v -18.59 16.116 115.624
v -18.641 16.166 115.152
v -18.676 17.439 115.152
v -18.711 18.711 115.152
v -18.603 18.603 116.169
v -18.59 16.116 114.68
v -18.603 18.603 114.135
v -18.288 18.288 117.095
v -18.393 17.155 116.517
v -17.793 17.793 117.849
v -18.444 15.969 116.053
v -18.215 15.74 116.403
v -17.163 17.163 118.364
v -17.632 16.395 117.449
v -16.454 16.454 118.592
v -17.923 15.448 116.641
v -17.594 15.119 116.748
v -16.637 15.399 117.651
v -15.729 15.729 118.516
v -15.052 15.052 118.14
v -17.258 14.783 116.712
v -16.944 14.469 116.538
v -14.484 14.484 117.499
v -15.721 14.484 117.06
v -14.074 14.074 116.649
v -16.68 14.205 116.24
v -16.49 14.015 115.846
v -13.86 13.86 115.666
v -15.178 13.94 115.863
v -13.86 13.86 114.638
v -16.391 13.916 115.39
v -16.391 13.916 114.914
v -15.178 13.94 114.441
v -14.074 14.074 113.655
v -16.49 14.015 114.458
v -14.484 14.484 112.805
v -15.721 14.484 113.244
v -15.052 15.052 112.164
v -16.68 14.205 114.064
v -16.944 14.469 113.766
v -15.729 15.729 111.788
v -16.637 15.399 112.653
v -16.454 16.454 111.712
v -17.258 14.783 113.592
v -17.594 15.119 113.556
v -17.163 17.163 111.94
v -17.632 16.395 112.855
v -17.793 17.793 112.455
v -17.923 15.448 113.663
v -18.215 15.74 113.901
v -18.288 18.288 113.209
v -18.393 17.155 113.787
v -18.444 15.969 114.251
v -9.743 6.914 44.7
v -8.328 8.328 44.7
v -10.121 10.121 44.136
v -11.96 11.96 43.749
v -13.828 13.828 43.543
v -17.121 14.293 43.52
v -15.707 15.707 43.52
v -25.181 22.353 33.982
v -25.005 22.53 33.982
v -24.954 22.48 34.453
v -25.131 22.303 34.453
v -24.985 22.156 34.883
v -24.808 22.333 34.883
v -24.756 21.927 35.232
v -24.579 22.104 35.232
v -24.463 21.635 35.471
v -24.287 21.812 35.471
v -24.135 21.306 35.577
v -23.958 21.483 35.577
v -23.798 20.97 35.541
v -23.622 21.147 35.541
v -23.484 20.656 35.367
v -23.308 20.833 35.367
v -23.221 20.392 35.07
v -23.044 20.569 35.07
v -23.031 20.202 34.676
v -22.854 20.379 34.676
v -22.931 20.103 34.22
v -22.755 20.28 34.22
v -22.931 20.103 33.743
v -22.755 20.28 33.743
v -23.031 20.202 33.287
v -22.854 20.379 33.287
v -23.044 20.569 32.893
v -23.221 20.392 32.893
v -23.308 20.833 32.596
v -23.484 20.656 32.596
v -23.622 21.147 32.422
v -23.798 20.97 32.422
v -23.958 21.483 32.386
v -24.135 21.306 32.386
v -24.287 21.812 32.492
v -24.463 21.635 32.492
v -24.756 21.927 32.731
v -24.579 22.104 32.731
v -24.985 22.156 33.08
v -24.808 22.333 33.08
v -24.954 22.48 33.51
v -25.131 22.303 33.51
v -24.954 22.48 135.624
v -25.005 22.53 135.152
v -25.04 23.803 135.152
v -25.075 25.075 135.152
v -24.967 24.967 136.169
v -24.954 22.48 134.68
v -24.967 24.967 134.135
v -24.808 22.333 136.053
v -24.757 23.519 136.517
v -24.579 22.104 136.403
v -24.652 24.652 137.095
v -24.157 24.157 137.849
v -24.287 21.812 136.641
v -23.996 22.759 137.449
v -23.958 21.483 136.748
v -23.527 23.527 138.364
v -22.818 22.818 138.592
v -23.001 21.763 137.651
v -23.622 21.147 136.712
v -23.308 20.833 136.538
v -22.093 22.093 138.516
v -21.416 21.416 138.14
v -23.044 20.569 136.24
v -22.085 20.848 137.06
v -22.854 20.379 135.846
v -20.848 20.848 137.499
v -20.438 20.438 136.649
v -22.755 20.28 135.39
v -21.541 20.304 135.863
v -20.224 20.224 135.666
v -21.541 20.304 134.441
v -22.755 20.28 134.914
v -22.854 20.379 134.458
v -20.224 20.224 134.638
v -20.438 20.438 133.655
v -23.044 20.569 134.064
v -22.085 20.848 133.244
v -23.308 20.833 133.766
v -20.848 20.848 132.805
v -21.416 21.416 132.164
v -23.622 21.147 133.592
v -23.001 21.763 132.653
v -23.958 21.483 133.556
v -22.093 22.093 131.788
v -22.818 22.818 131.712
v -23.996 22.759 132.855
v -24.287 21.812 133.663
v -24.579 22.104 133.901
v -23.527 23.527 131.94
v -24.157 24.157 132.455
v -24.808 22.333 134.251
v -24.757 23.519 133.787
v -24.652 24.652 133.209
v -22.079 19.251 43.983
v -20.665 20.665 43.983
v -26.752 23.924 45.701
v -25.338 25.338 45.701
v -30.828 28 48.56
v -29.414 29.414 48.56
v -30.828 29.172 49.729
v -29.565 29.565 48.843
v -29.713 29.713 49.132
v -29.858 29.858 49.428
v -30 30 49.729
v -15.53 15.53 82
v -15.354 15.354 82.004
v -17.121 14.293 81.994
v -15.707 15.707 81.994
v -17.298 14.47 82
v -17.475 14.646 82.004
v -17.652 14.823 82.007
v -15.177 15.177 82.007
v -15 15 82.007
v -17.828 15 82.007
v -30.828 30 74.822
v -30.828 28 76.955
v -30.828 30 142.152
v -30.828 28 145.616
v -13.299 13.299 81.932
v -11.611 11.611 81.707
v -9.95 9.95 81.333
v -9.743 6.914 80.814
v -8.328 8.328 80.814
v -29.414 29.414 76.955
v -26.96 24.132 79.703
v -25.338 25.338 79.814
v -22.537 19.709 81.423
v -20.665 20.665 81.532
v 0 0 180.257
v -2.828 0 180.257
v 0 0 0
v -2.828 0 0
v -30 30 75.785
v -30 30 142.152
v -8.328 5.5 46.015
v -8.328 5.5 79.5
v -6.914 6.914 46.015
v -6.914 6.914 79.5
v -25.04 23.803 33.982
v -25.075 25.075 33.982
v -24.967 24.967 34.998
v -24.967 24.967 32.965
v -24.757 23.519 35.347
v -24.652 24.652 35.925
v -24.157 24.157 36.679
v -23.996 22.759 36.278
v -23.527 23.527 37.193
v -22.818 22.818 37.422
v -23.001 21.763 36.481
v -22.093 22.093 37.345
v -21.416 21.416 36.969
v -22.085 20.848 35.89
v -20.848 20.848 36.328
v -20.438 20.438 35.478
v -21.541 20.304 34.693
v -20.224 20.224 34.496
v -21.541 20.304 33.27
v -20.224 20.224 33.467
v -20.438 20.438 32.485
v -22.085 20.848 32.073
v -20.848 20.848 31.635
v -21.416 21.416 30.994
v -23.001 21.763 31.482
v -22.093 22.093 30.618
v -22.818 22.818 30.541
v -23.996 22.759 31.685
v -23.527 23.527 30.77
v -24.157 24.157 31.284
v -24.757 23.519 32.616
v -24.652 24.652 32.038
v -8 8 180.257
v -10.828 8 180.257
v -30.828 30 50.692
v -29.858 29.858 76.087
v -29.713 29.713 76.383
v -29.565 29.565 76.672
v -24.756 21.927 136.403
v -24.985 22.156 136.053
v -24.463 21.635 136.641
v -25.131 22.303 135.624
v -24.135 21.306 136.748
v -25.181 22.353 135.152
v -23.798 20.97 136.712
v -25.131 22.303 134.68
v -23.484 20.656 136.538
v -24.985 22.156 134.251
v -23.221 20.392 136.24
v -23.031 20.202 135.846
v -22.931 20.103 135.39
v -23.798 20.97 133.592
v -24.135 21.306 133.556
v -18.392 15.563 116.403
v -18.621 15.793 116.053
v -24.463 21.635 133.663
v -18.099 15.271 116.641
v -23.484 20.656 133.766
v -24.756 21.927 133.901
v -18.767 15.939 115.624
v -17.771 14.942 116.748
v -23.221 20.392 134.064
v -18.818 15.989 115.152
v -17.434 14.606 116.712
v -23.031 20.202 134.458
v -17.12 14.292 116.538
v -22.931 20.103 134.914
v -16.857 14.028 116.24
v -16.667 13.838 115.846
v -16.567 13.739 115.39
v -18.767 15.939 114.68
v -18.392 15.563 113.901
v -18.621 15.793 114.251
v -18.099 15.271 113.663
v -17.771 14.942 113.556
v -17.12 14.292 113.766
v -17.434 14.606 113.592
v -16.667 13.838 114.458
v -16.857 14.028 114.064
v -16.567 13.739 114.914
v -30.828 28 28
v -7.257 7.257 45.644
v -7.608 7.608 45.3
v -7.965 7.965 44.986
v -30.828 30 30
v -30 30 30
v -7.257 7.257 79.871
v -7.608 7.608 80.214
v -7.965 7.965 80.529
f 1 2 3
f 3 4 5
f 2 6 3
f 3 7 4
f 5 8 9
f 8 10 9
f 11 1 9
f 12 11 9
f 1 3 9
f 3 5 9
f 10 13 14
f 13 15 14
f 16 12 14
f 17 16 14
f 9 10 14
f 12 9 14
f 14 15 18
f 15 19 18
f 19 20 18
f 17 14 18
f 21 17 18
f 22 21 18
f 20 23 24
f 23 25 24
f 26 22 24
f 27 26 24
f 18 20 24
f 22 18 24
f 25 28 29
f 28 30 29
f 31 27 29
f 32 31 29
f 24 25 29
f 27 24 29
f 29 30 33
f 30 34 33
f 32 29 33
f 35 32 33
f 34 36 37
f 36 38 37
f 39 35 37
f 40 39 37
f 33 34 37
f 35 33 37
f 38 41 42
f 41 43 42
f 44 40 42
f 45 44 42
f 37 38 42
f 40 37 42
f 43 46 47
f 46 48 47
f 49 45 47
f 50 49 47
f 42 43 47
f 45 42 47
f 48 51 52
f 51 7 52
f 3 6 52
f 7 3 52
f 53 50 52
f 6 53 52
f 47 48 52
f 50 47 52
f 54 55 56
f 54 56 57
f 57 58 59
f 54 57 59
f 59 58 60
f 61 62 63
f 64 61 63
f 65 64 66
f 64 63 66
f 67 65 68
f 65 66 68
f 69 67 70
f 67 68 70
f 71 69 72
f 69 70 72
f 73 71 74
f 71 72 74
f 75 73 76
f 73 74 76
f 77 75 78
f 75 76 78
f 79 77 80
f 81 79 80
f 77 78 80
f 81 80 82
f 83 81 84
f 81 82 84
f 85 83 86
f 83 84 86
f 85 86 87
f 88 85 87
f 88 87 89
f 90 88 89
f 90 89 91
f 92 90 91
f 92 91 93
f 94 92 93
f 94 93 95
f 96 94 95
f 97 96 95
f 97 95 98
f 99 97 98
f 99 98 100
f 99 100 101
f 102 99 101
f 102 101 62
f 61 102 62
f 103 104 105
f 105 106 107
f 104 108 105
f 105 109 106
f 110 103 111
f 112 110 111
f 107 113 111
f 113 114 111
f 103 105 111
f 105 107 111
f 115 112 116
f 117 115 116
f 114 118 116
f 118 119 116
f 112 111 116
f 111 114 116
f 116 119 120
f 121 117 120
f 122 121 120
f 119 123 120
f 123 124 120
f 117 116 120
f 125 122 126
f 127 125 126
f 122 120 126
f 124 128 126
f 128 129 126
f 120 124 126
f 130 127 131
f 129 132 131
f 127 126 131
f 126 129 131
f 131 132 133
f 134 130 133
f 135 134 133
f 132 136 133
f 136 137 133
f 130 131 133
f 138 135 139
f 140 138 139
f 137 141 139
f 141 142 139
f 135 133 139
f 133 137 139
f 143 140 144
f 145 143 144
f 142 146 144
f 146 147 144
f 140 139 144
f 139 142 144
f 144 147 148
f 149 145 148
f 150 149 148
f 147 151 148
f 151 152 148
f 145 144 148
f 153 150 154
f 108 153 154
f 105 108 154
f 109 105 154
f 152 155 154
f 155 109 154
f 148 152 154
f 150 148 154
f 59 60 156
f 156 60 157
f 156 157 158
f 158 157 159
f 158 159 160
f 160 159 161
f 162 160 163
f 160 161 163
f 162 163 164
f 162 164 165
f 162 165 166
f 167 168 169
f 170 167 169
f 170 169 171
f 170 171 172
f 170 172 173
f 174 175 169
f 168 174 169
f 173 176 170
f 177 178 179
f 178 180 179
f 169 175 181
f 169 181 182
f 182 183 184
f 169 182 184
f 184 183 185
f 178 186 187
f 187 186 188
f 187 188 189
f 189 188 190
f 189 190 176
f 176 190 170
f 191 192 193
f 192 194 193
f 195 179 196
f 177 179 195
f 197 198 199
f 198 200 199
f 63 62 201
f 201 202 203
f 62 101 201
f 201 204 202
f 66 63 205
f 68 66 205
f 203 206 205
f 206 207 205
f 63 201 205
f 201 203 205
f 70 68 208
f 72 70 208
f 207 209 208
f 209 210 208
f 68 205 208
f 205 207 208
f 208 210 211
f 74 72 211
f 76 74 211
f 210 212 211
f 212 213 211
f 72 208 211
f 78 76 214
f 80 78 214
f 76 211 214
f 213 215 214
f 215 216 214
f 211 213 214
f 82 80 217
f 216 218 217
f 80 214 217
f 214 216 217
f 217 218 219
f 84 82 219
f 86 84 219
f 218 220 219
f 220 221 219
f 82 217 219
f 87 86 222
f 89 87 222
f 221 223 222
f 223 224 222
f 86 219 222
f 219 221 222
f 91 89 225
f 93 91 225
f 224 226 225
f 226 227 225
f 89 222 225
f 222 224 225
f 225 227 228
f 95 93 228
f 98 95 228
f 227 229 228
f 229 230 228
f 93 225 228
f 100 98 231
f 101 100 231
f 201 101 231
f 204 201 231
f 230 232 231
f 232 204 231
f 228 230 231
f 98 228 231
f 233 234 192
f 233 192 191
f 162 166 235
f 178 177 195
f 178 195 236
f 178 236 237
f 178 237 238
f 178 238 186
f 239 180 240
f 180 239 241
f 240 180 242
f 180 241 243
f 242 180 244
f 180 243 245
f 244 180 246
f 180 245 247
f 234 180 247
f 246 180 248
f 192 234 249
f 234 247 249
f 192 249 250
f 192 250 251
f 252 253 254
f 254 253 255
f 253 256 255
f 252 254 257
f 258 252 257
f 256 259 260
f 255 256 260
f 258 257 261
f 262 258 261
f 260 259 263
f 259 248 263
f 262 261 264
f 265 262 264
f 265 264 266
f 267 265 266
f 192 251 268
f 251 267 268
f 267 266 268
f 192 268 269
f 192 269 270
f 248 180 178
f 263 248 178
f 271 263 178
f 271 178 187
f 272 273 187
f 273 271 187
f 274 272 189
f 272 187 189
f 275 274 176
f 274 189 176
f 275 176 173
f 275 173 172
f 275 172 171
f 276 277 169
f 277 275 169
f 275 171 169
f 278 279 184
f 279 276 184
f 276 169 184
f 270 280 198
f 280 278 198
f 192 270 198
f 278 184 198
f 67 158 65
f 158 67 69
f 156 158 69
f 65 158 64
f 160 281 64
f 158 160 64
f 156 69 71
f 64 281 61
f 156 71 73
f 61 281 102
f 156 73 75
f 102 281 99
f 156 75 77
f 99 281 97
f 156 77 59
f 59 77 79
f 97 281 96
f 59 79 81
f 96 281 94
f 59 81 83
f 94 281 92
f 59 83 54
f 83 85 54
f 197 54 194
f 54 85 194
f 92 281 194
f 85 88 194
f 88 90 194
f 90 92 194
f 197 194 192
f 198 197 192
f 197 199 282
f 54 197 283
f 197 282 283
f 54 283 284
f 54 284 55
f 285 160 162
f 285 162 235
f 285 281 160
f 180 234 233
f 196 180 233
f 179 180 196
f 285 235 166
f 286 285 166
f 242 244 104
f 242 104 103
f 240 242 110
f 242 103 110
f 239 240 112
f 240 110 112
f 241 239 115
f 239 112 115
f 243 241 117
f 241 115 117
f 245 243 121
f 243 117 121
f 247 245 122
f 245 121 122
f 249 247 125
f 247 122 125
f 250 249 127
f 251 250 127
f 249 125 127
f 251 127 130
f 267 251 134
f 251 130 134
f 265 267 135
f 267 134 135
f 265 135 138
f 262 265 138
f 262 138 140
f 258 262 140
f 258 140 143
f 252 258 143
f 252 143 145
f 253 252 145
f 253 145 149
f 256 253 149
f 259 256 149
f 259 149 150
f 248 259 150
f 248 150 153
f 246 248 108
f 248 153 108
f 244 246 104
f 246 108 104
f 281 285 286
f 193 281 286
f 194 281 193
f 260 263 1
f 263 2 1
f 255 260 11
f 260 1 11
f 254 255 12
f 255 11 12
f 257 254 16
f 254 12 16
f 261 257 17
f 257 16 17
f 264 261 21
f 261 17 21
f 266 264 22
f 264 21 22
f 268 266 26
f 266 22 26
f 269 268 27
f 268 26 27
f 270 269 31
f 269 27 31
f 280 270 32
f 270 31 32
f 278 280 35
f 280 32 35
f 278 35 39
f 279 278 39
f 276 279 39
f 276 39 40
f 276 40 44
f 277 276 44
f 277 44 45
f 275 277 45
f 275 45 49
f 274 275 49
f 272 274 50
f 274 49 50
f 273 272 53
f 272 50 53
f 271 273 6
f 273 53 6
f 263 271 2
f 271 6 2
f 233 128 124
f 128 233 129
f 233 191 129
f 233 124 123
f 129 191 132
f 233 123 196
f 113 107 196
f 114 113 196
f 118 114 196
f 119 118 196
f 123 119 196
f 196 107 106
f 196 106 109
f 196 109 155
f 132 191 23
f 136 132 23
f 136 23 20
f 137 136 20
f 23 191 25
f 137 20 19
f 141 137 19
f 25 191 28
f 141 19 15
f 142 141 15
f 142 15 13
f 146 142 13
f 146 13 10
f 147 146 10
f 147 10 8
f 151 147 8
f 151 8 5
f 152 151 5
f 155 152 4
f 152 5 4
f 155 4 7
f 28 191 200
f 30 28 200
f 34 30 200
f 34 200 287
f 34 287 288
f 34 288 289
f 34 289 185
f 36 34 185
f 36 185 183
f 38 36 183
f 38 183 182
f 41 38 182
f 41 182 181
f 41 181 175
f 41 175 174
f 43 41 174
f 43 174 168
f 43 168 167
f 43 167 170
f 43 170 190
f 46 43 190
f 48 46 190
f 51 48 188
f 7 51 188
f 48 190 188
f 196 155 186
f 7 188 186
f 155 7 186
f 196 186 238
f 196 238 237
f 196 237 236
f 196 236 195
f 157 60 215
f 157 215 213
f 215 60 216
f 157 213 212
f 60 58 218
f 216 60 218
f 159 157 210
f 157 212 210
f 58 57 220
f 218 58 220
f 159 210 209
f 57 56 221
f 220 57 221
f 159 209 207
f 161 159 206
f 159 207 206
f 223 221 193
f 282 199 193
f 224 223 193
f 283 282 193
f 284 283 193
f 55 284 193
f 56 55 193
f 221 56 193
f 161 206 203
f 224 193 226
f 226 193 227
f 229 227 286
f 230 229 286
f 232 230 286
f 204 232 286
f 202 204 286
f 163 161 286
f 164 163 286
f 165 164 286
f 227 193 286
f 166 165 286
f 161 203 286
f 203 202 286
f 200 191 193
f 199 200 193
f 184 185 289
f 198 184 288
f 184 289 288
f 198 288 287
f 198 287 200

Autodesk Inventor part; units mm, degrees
ref_plane "YZ Plane" through (0, 0, 0) normal (1, 0, 0) x (0, 1, 0)
ref_plane "XZ Plane" through (0, 0, 0) normal (0, 1, 0) x (-1, 0, 0)
ref_plane "XY Plane" through (0, 0, 0) normal (0, 0, 1) x (1, 0, 0)
sketch "Szkic1" plane through (0, 0, 0) normal (0, 0, 1) x (1, 0, 0)
  line L0 (0, 0) -> (-30, 30)
  line L1 (-30, 30) -> (-30, 27.1716)
  line L2 (-30, 27.1716) -> (-2.8284, 0)
  line L3 (-2.8284, 0) -> (0, 0)
  line L4 (-30, 27.1716) -> (-30.8284, 28)
  line L5 (-30.8284, 28) -> (-30.8284, 30)
  line L6 (-30.8284, 30) -> (-30, 30)
  dimension "d0" = 2
  dimension "d1" = 30
  dimension "d2" = 45
  dimension "d3" = 2
extrude "Wyciągnięcie proste1" add sketch "Szkic1" along normal blind 180.257
sketch "Szkic2" plane through (-30.8284, 28, 0) normal (-1, 0, 0) x (0, 0, 1)
  line L0 (0, 0) -> (0, -28) projected
  line L1 (0, 2) -> (180.257, 2) projected
  line L2 (0, -28) -> (0, 2)
  line L3 (0, 2) -> (30, 2)
  line L4 (0, 0) -> (180.257, 0) projected
  line L5 (30, 2) -> (0, -28)
  line L6 (180.257, 2) -> (180.257, -20)
  line L7 (180.257, 0) -> (180.257, -28) projected
  line L8 (180.257, 2) -> (142.1519, 2)
  line L9 (180.257, -20) -> (142.1519, 2)
  dimension "d6" = 45
  dimension "d7" = 30
  dimension "d8" = 22
extrude "Wyciągnięcie proste2" cut sketch "Szkic2" against normal through all contours L4 L5 L0 | L2 L1 L5 L4 | L9 L1 L6 L4 | L4 L6 L9
sketch "Szkic3" plane through (0, 0, 0) normal (0.7071, 0.7071, 0) x (-0.7071, 0.7071, 0)
  line L0 (42.4264, 30) -> (42.4264, 142.1519) construction
  line L1 (42.4264, 115.152) -> (23.012, 115.152) construction
  circle A0 centre (32.012, 135.152) radius 1.6
  circle A1 centre (23.012, 115.152) radius 1.6
  circle A2 centre (32.012, 33.9815) radius 1.6
  line L2 (41.598, 28) -> (41.598, 145.616) projected
  point P0 (0, 0)
  dimension "d17" = 3.2
  dimension "d37" = 9.586
  dimension "d38" = 5.9815
  dimension "d39" = 10.464
  dimension "d40" = 30.464
  dimension "d41" = 18.586
extrude "Wyciągnięcie proste3" cut sketch "Szkic3" against normal through all
chamfer "Faza1" distance 1.85 distance2 1.75 1 edges at (-15.1406, 15.1406, 115.152) measured on face at (-5.0469, 5.0469, 98.4697)
chamfer "Faza2" distance 1.85 distance2 1.75 1 edges at (-21.5045, 21.5045, 135.152) measured on face at (-4.6108, 4.6108, 98.4697)
chamfer "Faza3" distance 1.85 distance2 1.75 1 edges at (-21.5045, 21.5045, 33.9815) measured on face at (-4.6108, 4.6108, 98.4697)
sketch "Szkic4" plane through (-30.8284, 28, 28) normal (-1, 0, 0) x (0, 0, 1)
  circle A0 centre (34.7574, -13) radius 19.25
  line L0 (-28, -28) -> (152.257, -28) projected
  dimension "d29" = 62.7574
  dimension "d30" = 38.5
  dimension "d31" = 15
extrude "Wyciągnięcie proste4" cut sketch "Szkic4" against normal blind 22.5
sketch "Szkic5" plane through (0, 0, 0) normal (0.7071, 0.7071, 0) x (-0.7071, 0.7071, 0)
  line L0 (9.7782, 79.4999) -> (9.7782, 46.0149) projected
  line L1 (9.7782, 79.4999) -> (9.7782, 46.0149)
  ellipse E0 centre (16.4957, 62.7574) end of major axis (16.4957, 43.5074) minor radius 13.6118 (9.7782, 46.0149) -> (11.7782, 44.7005) ccw projected
  ellipse E1 centre (16.4957, 62.7574) end of major axis (16.4957, 43.5074) minor radius 13.6118 (11.7782, 80.8143) -> (9.7782, 79.4999) ccw projected
  ellipse E2 centre (23.2132, 62.7574) end of major axis (50.4368, 62.7574) minor radius 19.25 (41.598, 76.9547) -> (9.7782, 79.4999) ccw projected
  ellipse E3 centre (32.4056, 62.7574) end of major axis (32.4056, 43.5074) minor radius 13.6118 (43.0122, 74.8223) -> (41.598, 76.9547) ccw projected
  ellipse E4 centre (32.4056, 62.7574) end of major axis (32.4056, 43.5074) minor radius 13.6118 (41.598, 48.5601) -> (43.0122, 50.6925) ccw projected
  line L2 (43.0122, 74.8223) -> (43.0122, 50.6925)
  ellipse E5 centre (23.2132, 62.7574) end of major axis (50.4368, 62.7574) minor radius 19.25 (9.7782, 46.0149) -> (41.598, 48.5601) ccw projected
  ellipse E6 centre (21.2132, 62.7574) end of major axis (48.4368, 62.7574) minor radius 19.25 (11.7782, 44.7005) -> (42.4264, 50.6925) ccw projected
  ellipse E7 centre (21.2132, 62.7574) end of major axis (48.4368, 62.7574) minor radius 19.25 (42.4264, 74.8223) -> (11.7782, 80.8143) ccw projected
  line L3 (42.4264, 30) -> (42.4264, 50.6925) projected
  line L4 (42.4264, 74.8223) -> (42.4264, 50.6925)
  point P0 (0, 0)
  point P1 (41.598, 48.5601)
extrude "Wyciągnięcie proste5" cut sketch "Szkic5" against normal through all
properties part number "Bok2mm"
